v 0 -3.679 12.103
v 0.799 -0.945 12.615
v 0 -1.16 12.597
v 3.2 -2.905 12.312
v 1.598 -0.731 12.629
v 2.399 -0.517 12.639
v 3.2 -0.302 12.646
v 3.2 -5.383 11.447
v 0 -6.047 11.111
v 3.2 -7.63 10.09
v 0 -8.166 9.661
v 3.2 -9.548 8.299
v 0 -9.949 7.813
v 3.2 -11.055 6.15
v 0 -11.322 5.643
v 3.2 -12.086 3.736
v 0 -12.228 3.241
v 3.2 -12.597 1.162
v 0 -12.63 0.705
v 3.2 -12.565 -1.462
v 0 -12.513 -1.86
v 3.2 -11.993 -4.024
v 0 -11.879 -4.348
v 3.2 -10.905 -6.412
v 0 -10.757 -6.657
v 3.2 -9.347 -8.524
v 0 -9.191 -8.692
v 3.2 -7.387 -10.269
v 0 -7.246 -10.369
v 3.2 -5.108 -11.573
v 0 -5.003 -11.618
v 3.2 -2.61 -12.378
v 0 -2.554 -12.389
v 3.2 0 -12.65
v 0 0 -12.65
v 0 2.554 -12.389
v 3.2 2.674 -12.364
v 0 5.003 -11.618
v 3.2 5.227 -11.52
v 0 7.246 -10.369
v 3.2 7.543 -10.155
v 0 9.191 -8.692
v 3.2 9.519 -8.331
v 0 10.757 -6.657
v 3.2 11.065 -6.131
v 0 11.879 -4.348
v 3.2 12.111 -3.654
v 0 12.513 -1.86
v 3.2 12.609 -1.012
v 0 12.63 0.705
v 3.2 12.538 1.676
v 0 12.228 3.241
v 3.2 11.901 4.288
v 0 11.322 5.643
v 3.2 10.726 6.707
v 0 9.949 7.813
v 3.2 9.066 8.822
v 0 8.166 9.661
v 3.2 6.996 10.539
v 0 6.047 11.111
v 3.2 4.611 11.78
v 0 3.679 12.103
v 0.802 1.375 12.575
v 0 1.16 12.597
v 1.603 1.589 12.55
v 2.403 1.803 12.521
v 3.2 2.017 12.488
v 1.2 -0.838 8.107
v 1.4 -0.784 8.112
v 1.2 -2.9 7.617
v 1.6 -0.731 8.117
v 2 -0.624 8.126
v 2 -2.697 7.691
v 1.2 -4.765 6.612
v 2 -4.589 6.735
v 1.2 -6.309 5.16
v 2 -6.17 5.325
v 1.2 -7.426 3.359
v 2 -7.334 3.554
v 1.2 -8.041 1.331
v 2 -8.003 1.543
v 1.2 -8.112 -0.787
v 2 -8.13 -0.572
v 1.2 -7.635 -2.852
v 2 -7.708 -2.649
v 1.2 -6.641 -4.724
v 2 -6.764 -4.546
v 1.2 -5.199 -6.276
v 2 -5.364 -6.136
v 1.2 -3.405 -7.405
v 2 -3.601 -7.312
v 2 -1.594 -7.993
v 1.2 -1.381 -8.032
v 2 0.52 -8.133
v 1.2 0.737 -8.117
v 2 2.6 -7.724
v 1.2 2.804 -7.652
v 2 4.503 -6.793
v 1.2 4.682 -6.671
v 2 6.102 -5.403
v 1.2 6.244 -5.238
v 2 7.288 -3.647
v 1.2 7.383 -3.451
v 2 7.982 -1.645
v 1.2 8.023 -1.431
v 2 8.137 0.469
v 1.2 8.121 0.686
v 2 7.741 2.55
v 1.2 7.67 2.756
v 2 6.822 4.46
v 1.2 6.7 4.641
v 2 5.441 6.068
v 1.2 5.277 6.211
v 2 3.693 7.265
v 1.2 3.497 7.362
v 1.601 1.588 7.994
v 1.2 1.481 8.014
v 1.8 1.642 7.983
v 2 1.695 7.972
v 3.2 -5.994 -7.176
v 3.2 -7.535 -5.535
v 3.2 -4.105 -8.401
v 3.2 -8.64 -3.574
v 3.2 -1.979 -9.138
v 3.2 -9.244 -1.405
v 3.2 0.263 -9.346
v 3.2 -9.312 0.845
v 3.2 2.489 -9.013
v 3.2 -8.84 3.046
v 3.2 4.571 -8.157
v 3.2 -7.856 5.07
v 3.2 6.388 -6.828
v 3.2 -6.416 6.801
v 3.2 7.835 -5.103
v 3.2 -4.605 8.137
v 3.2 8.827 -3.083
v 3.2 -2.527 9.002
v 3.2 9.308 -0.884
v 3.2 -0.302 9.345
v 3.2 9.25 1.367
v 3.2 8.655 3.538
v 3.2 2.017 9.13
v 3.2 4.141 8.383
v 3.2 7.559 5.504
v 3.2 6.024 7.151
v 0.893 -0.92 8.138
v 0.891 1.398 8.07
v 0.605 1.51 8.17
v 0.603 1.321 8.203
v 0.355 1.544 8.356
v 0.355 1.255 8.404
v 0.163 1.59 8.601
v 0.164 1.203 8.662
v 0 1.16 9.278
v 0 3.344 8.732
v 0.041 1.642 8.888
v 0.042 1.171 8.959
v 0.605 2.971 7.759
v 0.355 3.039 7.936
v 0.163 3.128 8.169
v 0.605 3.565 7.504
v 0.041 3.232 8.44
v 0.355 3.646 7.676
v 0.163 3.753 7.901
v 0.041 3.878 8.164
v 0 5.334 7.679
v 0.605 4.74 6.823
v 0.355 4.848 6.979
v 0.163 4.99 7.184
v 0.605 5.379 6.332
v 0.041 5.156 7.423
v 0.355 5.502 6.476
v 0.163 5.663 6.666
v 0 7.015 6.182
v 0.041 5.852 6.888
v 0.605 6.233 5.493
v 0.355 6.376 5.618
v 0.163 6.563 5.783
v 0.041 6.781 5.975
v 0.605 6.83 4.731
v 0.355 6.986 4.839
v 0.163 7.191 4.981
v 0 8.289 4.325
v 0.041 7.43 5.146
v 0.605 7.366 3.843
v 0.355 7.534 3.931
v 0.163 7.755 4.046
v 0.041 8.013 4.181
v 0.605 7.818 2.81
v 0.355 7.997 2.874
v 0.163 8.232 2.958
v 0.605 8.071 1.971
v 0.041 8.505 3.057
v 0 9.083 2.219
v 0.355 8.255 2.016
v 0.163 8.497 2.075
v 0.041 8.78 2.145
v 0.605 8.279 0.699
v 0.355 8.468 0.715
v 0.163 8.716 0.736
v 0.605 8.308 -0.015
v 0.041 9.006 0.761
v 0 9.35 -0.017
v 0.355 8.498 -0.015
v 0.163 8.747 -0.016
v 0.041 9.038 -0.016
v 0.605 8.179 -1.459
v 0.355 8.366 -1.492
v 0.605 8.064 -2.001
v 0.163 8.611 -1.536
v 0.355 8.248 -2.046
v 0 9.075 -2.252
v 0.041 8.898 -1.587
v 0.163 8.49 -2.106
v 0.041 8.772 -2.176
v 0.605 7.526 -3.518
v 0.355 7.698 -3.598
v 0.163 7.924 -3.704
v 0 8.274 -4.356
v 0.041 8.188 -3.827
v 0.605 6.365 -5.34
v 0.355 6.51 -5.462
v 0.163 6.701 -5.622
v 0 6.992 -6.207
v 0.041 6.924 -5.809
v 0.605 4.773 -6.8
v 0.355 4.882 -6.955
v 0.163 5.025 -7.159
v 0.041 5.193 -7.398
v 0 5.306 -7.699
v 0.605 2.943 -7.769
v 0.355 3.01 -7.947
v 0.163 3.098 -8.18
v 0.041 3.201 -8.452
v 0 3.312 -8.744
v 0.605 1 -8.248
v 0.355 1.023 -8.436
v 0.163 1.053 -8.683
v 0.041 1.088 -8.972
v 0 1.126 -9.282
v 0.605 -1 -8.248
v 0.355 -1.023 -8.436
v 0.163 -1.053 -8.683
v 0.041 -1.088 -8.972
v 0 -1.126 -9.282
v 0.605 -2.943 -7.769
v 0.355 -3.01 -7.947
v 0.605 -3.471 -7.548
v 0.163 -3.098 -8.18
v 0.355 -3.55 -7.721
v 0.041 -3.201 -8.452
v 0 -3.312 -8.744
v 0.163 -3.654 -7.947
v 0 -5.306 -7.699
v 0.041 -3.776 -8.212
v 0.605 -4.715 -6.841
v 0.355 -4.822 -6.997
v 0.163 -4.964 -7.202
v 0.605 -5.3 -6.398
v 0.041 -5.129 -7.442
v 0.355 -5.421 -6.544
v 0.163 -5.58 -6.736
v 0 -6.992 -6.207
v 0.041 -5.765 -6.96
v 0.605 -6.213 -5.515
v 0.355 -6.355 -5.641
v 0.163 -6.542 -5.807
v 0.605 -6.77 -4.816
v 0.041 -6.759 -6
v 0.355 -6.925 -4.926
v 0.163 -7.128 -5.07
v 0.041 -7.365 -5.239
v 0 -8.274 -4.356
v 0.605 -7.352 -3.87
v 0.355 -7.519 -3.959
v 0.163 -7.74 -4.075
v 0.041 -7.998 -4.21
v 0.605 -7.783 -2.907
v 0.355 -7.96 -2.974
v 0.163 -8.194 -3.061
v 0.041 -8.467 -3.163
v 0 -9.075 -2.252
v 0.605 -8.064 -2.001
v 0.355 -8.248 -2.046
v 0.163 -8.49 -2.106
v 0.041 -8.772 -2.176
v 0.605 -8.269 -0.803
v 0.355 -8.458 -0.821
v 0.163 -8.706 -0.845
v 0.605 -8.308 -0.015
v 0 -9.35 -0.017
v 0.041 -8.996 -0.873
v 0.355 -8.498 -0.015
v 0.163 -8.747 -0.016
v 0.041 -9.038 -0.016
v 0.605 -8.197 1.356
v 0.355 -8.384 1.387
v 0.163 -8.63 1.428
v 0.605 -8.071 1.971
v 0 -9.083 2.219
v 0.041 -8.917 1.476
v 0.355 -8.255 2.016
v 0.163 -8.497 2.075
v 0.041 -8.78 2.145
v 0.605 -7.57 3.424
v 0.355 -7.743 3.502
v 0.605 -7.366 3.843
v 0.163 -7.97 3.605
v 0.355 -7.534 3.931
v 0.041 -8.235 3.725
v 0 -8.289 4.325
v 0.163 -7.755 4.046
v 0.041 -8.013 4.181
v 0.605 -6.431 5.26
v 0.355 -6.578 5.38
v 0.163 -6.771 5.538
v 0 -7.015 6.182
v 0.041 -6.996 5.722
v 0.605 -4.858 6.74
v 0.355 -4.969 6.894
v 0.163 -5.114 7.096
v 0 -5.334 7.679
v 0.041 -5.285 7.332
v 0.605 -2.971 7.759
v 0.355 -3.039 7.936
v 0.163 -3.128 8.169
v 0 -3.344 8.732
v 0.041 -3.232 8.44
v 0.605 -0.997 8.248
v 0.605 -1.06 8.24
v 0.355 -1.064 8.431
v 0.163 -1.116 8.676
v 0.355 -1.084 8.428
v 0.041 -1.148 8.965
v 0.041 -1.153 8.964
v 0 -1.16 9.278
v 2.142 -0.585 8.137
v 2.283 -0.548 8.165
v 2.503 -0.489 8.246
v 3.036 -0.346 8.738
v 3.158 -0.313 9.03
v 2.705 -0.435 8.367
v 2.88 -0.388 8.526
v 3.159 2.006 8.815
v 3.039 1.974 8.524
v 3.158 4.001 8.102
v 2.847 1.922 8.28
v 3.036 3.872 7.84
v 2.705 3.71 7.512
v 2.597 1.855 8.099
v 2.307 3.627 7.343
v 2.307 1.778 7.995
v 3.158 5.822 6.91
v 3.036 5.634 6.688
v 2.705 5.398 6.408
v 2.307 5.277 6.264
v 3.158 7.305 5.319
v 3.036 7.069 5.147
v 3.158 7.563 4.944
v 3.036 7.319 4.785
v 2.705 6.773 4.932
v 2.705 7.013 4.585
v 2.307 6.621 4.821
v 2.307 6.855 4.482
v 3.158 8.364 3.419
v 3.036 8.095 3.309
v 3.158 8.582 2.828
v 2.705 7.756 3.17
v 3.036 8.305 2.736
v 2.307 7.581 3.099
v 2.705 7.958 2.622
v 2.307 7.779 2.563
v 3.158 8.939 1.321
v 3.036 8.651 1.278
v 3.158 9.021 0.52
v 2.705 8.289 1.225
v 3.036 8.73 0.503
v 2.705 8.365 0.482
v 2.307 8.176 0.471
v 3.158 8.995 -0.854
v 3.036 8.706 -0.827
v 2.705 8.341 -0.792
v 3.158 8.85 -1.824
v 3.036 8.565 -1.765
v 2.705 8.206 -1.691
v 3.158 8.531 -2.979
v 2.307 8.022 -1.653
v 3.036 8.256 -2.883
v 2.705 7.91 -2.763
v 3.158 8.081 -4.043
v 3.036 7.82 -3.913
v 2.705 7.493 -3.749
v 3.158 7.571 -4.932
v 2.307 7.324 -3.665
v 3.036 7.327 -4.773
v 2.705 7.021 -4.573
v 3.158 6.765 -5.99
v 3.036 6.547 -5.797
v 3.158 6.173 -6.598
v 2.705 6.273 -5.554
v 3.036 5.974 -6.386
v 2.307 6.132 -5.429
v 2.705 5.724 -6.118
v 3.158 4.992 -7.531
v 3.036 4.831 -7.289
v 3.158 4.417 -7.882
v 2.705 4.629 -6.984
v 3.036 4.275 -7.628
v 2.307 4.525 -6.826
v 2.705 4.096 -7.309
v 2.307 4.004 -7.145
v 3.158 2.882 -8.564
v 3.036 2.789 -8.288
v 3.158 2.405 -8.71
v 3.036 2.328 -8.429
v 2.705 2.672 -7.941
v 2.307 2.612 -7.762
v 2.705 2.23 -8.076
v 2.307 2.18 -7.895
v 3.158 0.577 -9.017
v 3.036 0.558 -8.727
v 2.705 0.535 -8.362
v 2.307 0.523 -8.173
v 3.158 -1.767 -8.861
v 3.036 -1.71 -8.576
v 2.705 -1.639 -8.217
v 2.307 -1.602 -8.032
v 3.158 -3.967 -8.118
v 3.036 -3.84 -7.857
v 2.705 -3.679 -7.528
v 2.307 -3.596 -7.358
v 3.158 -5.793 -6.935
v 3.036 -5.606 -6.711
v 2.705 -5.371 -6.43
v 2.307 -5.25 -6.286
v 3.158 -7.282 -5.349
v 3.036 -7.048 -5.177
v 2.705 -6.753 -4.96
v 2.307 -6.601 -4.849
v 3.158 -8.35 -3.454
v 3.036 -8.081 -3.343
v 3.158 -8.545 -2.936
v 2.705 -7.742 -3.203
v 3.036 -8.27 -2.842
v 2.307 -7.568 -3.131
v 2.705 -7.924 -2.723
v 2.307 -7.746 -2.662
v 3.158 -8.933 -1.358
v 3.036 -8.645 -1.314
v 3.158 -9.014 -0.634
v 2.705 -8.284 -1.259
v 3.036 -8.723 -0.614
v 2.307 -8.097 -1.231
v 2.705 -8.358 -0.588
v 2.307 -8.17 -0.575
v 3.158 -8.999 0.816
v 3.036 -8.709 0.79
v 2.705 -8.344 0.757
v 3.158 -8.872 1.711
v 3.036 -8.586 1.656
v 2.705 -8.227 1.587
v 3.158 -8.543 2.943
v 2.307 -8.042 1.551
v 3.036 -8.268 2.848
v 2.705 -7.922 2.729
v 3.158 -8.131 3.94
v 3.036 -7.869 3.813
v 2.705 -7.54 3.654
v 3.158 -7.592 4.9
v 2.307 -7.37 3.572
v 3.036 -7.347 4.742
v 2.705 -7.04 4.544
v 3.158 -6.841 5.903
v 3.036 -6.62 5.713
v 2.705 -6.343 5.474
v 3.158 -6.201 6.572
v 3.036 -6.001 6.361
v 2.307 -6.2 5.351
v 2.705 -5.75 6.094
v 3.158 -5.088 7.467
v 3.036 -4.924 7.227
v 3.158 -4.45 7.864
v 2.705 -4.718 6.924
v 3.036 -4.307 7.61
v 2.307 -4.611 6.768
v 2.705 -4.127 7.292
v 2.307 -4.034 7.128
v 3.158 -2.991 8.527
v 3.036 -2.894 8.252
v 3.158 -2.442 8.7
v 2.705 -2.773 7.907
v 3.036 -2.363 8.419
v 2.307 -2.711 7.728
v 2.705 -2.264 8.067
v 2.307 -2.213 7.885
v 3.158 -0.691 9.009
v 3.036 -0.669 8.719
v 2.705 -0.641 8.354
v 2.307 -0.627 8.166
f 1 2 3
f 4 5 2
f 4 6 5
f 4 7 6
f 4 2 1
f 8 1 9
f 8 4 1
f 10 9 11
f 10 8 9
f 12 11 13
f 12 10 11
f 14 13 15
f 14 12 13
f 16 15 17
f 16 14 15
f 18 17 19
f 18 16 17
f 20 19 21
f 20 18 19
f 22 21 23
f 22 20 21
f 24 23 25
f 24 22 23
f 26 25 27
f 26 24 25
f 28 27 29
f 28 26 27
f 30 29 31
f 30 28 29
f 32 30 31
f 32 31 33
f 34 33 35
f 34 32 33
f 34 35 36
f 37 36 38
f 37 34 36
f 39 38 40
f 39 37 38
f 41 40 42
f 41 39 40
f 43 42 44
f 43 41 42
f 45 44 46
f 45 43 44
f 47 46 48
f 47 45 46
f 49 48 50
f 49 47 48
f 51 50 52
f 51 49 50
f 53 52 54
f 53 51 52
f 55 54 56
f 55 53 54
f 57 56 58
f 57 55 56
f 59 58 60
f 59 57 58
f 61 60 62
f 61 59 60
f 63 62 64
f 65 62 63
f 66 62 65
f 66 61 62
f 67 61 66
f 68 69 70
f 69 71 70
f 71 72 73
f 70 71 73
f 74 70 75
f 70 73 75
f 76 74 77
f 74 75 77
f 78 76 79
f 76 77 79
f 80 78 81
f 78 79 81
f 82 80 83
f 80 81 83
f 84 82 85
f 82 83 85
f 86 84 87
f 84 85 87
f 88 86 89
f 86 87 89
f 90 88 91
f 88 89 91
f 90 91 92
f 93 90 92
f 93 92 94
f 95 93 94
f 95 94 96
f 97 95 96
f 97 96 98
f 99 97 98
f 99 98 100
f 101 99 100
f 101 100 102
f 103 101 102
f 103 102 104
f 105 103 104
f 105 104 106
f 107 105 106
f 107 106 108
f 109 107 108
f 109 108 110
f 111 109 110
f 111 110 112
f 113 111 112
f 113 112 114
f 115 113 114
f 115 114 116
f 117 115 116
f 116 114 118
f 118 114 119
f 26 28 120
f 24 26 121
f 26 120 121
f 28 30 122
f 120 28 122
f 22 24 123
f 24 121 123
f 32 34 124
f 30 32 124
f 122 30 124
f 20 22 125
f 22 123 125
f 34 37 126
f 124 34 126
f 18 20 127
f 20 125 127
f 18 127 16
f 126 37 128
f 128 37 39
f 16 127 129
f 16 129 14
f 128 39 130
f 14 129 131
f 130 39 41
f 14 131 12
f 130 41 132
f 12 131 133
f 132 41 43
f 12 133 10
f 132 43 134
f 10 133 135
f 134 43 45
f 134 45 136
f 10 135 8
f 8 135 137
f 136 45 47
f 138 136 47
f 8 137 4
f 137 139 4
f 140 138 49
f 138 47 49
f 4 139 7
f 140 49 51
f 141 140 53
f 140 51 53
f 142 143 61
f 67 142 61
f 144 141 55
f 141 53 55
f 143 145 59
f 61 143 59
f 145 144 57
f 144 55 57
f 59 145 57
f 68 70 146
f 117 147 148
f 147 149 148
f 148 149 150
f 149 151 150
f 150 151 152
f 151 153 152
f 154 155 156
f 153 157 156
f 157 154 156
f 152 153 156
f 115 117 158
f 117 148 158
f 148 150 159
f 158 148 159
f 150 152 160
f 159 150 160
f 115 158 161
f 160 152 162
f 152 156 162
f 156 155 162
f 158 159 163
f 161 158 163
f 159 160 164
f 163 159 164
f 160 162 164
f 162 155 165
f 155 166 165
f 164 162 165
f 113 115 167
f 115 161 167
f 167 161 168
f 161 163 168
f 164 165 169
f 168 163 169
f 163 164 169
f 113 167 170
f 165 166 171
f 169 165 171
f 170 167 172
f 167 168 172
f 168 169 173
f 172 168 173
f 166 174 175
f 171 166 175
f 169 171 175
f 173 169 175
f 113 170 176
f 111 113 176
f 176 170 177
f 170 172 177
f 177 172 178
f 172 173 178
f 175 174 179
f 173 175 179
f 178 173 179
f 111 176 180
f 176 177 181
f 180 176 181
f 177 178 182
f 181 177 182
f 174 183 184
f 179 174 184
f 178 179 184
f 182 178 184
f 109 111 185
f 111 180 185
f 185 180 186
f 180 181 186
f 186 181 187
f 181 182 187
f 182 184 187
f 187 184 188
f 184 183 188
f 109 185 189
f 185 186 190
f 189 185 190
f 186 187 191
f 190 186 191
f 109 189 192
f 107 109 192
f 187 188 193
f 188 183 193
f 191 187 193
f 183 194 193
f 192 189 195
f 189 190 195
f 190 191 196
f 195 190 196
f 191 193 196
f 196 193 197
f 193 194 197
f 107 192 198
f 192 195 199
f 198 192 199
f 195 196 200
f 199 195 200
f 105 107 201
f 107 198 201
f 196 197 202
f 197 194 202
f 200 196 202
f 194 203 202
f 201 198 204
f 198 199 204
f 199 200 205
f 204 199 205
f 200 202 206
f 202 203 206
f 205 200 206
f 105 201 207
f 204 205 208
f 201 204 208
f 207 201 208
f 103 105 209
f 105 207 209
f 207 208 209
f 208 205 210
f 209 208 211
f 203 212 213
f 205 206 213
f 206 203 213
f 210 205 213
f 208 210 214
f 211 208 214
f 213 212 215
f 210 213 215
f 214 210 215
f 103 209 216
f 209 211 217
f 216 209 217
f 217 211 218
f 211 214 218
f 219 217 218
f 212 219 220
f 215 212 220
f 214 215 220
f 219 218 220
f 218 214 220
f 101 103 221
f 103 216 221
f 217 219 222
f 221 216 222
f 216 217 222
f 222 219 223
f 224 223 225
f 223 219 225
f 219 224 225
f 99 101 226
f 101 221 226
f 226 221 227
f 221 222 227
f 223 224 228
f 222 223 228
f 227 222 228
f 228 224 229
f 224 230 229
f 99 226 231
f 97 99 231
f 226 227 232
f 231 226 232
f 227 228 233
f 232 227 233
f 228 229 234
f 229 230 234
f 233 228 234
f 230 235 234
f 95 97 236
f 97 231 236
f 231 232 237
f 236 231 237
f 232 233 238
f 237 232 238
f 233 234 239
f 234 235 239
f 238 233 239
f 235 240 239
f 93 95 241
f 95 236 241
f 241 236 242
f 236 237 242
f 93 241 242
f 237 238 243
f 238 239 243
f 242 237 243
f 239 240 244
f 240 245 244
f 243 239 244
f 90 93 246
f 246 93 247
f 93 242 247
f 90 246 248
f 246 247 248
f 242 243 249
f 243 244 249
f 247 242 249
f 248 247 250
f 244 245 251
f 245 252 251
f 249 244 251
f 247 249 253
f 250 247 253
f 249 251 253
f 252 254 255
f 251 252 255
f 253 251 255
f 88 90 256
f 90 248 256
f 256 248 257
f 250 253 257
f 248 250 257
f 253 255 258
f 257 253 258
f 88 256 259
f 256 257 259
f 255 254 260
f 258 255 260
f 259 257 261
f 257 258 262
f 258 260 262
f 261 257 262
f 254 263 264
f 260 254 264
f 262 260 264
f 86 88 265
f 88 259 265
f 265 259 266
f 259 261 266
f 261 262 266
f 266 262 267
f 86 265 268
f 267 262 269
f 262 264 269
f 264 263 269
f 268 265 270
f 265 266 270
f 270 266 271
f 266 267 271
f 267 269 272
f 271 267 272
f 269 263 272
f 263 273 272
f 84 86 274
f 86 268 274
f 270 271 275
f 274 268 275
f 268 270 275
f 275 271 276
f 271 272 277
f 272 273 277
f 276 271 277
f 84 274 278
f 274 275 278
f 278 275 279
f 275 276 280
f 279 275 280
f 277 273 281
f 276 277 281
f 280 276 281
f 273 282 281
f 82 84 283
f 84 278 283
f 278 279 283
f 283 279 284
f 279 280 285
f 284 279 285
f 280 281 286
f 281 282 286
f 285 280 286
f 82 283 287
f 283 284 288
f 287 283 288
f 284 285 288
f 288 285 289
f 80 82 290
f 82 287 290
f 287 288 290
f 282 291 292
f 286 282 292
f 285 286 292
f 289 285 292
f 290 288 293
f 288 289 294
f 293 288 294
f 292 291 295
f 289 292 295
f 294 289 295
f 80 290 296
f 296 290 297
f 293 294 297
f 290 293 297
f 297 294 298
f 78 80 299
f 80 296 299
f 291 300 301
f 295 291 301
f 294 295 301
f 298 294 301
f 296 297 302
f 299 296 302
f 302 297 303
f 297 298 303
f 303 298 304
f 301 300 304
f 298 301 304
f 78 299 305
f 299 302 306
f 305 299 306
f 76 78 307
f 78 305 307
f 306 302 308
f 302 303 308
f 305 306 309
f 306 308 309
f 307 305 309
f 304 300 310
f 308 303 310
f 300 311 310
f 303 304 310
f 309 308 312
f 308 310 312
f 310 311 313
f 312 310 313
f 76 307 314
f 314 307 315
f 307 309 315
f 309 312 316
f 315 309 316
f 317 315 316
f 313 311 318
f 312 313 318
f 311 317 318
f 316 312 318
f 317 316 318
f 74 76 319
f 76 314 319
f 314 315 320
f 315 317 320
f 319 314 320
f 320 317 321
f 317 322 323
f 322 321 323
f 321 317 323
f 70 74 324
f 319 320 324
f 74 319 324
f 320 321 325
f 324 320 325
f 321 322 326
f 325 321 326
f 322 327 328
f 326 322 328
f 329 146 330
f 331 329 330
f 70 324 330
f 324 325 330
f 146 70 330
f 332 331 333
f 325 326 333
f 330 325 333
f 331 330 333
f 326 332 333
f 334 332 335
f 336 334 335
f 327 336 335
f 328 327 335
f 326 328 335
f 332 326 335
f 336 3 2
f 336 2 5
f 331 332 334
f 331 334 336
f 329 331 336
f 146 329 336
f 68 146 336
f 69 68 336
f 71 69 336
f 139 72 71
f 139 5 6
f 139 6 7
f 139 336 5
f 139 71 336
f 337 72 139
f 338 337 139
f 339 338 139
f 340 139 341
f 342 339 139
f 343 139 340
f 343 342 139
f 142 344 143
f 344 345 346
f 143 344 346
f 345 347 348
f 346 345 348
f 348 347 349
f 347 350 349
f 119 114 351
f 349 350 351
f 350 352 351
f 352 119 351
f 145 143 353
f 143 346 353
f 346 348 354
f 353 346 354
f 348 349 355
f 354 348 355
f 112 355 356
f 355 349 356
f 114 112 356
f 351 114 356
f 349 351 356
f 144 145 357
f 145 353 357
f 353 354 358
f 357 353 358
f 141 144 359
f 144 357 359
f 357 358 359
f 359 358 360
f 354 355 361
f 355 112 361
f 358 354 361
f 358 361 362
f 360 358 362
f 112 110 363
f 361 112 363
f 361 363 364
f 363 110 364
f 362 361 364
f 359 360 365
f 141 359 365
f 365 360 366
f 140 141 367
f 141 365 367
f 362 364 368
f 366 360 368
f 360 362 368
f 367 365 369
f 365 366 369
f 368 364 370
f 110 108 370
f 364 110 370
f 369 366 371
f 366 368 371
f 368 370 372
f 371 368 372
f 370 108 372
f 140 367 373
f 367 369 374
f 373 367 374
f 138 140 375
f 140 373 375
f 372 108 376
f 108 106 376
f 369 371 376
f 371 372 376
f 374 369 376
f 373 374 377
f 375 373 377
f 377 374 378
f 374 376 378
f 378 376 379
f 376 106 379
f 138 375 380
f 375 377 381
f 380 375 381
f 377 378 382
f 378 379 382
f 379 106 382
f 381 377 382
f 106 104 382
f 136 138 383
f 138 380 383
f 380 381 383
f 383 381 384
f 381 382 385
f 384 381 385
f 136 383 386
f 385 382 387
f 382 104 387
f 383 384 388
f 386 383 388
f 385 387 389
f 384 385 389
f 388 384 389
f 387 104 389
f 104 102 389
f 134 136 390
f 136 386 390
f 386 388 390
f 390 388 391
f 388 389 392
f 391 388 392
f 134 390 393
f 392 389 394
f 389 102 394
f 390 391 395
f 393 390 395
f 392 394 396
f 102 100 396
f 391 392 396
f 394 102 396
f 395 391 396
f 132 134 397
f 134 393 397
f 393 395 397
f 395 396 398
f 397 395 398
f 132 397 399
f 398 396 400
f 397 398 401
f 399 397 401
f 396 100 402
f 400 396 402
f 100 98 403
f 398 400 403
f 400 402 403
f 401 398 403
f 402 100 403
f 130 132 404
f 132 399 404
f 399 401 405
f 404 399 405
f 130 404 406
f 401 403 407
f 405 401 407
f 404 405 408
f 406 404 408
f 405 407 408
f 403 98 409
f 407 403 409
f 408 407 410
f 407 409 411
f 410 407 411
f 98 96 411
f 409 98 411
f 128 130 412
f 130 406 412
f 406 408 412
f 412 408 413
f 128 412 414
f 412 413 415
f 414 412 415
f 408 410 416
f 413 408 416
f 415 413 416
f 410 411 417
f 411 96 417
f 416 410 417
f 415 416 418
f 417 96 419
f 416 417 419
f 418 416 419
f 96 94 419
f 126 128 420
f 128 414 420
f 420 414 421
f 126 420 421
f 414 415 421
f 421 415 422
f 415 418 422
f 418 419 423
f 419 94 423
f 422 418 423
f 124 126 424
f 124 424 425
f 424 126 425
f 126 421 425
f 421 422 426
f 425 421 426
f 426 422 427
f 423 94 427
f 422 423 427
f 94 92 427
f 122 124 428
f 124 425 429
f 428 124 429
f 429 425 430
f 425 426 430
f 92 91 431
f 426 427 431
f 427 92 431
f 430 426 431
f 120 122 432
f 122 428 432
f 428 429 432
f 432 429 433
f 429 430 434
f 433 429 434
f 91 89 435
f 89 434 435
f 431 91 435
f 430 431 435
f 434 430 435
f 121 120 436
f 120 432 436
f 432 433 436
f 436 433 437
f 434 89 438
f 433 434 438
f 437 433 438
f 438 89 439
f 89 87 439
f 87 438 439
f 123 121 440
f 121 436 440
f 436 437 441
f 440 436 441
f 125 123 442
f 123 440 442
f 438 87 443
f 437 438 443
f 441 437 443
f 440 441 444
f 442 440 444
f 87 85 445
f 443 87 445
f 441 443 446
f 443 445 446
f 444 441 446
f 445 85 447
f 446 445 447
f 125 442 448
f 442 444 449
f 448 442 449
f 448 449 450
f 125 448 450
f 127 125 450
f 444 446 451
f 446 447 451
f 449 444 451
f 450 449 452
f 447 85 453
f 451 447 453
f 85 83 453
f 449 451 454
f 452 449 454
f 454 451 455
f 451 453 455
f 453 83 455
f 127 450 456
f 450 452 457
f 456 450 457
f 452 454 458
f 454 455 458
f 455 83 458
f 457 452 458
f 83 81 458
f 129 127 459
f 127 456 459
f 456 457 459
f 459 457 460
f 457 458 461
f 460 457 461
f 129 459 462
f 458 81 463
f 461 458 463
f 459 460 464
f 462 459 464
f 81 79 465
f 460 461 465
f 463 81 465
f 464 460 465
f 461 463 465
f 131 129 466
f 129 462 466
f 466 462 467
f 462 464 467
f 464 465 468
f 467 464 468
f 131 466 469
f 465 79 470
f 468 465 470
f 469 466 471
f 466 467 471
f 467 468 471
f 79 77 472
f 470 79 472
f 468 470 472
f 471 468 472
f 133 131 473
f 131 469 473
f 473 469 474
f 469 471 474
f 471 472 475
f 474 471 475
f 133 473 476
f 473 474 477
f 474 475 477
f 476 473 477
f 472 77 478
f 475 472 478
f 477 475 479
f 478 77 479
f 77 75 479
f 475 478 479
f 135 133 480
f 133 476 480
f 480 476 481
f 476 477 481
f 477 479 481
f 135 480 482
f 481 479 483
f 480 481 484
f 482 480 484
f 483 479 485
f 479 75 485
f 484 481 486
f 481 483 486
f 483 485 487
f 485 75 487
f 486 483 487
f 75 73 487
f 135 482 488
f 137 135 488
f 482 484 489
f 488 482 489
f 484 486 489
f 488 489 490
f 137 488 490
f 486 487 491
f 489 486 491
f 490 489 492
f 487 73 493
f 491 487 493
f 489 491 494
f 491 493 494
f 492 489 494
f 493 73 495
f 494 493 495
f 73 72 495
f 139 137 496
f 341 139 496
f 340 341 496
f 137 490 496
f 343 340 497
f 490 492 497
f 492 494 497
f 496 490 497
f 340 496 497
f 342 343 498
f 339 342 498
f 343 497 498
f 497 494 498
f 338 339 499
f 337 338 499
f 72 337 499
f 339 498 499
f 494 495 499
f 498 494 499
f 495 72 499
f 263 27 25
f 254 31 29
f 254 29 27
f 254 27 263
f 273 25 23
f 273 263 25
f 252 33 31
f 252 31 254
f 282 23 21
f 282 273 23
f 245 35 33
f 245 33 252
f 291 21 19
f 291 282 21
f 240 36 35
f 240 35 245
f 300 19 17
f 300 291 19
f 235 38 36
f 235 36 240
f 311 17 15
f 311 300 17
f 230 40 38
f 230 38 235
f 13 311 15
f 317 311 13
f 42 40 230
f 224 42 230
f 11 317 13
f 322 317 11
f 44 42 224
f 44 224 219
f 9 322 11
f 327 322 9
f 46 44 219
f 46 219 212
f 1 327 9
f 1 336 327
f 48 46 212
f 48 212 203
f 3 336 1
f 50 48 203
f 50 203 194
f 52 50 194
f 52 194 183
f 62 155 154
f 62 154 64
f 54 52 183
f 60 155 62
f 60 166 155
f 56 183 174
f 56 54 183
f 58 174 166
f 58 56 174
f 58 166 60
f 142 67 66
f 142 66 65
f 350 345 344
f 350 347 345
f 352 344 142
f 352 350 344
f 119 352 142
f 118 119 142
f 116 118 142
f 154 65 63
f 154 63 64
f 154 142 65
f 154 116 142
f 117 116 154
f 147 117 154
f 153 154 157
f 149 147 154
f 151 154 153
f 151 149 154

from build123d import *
from build123d.topology import SkipClean

# Parameters (mm, degrees)
SZKIC1_W                   = 3.2
SZKIC1_H                   = 4.5
OBR_T1_ANGLE               = 180
OBR_T1_OTHER_WAY_ANGLE     = 180
WYTNIJ_WYCI_GNI_CIE1_DEPTH = 32.6


with BuildPart() as part:
    # Szkic1 → Obrót1 (revolve)
    with BuildSketch(Plane(origin=(0, 0, 0), x_dir=(1, 0, 0), z_dir=(0, 1, 0))):
        with Locations((1.6, 10.4)):
            Rectangle(SZKIC1_W, SZKIC1_H)
    revolve(axis=Axis((1, 0, 0), (-1, 0, 0)), revolution_arc=OBR_T1_ANGLE)

    # Szkic1 → Obrót1 other way (revolve)
    with SkipClean():  # the faces are left unmerged after this step: merging them gives an invalid solid
        with BuildSketch(Plane(origin=(0, 0, 0), x_dir=(1, 0, 0), z_dir=(0, 1, 0))):
            with Locations((1.6, 10.4)):
                Rectangle(SZKIC1_W, SZKIC1_H)
        revolve(axis=Axis((1, 0, 0), (1, 0, 0)), revolution_arc=OBR_T1_OTHER_WAY_ANGLE)

    # Szkic2 → Wytnij-wyciągnięcie1 (cut)
    with BuildSketch(Plane.XY):
        Polygon((-3.2, 0.302071906), (-3.2, -2.016946738), (4.85, 0.140044261), (4.85, 2.459062905), align=None)
    extrude(amount=WYTNIJ_WYCI_GNI_CIE1_DEPTH, mode=Mode.SUBTRACT)

    # Szkic3 → Wycięcie-obrót1 (revolve, cut)
    with BuildSketch(Plane.XY):
        with BuildLine():
            Line((0, 5.433333333), (3.2, 5.433333333))
            Line((3.2, 5.433333333), (3.2, 9.35))
            ThreePointArc((3.2, 9.35), (2.848528137, 8.501471863), (2, 8.15))
            Line((2, 8.15), (1.2, 8.15))
            ThreePointArc((1.2, 8.15), (0.351471863, 8.501471863), (0, 9.35))
            Line((0, 9.35), (0, 5.433333333))
        make_face()
    revolve(axis=Axis((1, 0, 0), (-1, 0, 0)), mode=Mode.SUBTRACT)


solid = part.part
